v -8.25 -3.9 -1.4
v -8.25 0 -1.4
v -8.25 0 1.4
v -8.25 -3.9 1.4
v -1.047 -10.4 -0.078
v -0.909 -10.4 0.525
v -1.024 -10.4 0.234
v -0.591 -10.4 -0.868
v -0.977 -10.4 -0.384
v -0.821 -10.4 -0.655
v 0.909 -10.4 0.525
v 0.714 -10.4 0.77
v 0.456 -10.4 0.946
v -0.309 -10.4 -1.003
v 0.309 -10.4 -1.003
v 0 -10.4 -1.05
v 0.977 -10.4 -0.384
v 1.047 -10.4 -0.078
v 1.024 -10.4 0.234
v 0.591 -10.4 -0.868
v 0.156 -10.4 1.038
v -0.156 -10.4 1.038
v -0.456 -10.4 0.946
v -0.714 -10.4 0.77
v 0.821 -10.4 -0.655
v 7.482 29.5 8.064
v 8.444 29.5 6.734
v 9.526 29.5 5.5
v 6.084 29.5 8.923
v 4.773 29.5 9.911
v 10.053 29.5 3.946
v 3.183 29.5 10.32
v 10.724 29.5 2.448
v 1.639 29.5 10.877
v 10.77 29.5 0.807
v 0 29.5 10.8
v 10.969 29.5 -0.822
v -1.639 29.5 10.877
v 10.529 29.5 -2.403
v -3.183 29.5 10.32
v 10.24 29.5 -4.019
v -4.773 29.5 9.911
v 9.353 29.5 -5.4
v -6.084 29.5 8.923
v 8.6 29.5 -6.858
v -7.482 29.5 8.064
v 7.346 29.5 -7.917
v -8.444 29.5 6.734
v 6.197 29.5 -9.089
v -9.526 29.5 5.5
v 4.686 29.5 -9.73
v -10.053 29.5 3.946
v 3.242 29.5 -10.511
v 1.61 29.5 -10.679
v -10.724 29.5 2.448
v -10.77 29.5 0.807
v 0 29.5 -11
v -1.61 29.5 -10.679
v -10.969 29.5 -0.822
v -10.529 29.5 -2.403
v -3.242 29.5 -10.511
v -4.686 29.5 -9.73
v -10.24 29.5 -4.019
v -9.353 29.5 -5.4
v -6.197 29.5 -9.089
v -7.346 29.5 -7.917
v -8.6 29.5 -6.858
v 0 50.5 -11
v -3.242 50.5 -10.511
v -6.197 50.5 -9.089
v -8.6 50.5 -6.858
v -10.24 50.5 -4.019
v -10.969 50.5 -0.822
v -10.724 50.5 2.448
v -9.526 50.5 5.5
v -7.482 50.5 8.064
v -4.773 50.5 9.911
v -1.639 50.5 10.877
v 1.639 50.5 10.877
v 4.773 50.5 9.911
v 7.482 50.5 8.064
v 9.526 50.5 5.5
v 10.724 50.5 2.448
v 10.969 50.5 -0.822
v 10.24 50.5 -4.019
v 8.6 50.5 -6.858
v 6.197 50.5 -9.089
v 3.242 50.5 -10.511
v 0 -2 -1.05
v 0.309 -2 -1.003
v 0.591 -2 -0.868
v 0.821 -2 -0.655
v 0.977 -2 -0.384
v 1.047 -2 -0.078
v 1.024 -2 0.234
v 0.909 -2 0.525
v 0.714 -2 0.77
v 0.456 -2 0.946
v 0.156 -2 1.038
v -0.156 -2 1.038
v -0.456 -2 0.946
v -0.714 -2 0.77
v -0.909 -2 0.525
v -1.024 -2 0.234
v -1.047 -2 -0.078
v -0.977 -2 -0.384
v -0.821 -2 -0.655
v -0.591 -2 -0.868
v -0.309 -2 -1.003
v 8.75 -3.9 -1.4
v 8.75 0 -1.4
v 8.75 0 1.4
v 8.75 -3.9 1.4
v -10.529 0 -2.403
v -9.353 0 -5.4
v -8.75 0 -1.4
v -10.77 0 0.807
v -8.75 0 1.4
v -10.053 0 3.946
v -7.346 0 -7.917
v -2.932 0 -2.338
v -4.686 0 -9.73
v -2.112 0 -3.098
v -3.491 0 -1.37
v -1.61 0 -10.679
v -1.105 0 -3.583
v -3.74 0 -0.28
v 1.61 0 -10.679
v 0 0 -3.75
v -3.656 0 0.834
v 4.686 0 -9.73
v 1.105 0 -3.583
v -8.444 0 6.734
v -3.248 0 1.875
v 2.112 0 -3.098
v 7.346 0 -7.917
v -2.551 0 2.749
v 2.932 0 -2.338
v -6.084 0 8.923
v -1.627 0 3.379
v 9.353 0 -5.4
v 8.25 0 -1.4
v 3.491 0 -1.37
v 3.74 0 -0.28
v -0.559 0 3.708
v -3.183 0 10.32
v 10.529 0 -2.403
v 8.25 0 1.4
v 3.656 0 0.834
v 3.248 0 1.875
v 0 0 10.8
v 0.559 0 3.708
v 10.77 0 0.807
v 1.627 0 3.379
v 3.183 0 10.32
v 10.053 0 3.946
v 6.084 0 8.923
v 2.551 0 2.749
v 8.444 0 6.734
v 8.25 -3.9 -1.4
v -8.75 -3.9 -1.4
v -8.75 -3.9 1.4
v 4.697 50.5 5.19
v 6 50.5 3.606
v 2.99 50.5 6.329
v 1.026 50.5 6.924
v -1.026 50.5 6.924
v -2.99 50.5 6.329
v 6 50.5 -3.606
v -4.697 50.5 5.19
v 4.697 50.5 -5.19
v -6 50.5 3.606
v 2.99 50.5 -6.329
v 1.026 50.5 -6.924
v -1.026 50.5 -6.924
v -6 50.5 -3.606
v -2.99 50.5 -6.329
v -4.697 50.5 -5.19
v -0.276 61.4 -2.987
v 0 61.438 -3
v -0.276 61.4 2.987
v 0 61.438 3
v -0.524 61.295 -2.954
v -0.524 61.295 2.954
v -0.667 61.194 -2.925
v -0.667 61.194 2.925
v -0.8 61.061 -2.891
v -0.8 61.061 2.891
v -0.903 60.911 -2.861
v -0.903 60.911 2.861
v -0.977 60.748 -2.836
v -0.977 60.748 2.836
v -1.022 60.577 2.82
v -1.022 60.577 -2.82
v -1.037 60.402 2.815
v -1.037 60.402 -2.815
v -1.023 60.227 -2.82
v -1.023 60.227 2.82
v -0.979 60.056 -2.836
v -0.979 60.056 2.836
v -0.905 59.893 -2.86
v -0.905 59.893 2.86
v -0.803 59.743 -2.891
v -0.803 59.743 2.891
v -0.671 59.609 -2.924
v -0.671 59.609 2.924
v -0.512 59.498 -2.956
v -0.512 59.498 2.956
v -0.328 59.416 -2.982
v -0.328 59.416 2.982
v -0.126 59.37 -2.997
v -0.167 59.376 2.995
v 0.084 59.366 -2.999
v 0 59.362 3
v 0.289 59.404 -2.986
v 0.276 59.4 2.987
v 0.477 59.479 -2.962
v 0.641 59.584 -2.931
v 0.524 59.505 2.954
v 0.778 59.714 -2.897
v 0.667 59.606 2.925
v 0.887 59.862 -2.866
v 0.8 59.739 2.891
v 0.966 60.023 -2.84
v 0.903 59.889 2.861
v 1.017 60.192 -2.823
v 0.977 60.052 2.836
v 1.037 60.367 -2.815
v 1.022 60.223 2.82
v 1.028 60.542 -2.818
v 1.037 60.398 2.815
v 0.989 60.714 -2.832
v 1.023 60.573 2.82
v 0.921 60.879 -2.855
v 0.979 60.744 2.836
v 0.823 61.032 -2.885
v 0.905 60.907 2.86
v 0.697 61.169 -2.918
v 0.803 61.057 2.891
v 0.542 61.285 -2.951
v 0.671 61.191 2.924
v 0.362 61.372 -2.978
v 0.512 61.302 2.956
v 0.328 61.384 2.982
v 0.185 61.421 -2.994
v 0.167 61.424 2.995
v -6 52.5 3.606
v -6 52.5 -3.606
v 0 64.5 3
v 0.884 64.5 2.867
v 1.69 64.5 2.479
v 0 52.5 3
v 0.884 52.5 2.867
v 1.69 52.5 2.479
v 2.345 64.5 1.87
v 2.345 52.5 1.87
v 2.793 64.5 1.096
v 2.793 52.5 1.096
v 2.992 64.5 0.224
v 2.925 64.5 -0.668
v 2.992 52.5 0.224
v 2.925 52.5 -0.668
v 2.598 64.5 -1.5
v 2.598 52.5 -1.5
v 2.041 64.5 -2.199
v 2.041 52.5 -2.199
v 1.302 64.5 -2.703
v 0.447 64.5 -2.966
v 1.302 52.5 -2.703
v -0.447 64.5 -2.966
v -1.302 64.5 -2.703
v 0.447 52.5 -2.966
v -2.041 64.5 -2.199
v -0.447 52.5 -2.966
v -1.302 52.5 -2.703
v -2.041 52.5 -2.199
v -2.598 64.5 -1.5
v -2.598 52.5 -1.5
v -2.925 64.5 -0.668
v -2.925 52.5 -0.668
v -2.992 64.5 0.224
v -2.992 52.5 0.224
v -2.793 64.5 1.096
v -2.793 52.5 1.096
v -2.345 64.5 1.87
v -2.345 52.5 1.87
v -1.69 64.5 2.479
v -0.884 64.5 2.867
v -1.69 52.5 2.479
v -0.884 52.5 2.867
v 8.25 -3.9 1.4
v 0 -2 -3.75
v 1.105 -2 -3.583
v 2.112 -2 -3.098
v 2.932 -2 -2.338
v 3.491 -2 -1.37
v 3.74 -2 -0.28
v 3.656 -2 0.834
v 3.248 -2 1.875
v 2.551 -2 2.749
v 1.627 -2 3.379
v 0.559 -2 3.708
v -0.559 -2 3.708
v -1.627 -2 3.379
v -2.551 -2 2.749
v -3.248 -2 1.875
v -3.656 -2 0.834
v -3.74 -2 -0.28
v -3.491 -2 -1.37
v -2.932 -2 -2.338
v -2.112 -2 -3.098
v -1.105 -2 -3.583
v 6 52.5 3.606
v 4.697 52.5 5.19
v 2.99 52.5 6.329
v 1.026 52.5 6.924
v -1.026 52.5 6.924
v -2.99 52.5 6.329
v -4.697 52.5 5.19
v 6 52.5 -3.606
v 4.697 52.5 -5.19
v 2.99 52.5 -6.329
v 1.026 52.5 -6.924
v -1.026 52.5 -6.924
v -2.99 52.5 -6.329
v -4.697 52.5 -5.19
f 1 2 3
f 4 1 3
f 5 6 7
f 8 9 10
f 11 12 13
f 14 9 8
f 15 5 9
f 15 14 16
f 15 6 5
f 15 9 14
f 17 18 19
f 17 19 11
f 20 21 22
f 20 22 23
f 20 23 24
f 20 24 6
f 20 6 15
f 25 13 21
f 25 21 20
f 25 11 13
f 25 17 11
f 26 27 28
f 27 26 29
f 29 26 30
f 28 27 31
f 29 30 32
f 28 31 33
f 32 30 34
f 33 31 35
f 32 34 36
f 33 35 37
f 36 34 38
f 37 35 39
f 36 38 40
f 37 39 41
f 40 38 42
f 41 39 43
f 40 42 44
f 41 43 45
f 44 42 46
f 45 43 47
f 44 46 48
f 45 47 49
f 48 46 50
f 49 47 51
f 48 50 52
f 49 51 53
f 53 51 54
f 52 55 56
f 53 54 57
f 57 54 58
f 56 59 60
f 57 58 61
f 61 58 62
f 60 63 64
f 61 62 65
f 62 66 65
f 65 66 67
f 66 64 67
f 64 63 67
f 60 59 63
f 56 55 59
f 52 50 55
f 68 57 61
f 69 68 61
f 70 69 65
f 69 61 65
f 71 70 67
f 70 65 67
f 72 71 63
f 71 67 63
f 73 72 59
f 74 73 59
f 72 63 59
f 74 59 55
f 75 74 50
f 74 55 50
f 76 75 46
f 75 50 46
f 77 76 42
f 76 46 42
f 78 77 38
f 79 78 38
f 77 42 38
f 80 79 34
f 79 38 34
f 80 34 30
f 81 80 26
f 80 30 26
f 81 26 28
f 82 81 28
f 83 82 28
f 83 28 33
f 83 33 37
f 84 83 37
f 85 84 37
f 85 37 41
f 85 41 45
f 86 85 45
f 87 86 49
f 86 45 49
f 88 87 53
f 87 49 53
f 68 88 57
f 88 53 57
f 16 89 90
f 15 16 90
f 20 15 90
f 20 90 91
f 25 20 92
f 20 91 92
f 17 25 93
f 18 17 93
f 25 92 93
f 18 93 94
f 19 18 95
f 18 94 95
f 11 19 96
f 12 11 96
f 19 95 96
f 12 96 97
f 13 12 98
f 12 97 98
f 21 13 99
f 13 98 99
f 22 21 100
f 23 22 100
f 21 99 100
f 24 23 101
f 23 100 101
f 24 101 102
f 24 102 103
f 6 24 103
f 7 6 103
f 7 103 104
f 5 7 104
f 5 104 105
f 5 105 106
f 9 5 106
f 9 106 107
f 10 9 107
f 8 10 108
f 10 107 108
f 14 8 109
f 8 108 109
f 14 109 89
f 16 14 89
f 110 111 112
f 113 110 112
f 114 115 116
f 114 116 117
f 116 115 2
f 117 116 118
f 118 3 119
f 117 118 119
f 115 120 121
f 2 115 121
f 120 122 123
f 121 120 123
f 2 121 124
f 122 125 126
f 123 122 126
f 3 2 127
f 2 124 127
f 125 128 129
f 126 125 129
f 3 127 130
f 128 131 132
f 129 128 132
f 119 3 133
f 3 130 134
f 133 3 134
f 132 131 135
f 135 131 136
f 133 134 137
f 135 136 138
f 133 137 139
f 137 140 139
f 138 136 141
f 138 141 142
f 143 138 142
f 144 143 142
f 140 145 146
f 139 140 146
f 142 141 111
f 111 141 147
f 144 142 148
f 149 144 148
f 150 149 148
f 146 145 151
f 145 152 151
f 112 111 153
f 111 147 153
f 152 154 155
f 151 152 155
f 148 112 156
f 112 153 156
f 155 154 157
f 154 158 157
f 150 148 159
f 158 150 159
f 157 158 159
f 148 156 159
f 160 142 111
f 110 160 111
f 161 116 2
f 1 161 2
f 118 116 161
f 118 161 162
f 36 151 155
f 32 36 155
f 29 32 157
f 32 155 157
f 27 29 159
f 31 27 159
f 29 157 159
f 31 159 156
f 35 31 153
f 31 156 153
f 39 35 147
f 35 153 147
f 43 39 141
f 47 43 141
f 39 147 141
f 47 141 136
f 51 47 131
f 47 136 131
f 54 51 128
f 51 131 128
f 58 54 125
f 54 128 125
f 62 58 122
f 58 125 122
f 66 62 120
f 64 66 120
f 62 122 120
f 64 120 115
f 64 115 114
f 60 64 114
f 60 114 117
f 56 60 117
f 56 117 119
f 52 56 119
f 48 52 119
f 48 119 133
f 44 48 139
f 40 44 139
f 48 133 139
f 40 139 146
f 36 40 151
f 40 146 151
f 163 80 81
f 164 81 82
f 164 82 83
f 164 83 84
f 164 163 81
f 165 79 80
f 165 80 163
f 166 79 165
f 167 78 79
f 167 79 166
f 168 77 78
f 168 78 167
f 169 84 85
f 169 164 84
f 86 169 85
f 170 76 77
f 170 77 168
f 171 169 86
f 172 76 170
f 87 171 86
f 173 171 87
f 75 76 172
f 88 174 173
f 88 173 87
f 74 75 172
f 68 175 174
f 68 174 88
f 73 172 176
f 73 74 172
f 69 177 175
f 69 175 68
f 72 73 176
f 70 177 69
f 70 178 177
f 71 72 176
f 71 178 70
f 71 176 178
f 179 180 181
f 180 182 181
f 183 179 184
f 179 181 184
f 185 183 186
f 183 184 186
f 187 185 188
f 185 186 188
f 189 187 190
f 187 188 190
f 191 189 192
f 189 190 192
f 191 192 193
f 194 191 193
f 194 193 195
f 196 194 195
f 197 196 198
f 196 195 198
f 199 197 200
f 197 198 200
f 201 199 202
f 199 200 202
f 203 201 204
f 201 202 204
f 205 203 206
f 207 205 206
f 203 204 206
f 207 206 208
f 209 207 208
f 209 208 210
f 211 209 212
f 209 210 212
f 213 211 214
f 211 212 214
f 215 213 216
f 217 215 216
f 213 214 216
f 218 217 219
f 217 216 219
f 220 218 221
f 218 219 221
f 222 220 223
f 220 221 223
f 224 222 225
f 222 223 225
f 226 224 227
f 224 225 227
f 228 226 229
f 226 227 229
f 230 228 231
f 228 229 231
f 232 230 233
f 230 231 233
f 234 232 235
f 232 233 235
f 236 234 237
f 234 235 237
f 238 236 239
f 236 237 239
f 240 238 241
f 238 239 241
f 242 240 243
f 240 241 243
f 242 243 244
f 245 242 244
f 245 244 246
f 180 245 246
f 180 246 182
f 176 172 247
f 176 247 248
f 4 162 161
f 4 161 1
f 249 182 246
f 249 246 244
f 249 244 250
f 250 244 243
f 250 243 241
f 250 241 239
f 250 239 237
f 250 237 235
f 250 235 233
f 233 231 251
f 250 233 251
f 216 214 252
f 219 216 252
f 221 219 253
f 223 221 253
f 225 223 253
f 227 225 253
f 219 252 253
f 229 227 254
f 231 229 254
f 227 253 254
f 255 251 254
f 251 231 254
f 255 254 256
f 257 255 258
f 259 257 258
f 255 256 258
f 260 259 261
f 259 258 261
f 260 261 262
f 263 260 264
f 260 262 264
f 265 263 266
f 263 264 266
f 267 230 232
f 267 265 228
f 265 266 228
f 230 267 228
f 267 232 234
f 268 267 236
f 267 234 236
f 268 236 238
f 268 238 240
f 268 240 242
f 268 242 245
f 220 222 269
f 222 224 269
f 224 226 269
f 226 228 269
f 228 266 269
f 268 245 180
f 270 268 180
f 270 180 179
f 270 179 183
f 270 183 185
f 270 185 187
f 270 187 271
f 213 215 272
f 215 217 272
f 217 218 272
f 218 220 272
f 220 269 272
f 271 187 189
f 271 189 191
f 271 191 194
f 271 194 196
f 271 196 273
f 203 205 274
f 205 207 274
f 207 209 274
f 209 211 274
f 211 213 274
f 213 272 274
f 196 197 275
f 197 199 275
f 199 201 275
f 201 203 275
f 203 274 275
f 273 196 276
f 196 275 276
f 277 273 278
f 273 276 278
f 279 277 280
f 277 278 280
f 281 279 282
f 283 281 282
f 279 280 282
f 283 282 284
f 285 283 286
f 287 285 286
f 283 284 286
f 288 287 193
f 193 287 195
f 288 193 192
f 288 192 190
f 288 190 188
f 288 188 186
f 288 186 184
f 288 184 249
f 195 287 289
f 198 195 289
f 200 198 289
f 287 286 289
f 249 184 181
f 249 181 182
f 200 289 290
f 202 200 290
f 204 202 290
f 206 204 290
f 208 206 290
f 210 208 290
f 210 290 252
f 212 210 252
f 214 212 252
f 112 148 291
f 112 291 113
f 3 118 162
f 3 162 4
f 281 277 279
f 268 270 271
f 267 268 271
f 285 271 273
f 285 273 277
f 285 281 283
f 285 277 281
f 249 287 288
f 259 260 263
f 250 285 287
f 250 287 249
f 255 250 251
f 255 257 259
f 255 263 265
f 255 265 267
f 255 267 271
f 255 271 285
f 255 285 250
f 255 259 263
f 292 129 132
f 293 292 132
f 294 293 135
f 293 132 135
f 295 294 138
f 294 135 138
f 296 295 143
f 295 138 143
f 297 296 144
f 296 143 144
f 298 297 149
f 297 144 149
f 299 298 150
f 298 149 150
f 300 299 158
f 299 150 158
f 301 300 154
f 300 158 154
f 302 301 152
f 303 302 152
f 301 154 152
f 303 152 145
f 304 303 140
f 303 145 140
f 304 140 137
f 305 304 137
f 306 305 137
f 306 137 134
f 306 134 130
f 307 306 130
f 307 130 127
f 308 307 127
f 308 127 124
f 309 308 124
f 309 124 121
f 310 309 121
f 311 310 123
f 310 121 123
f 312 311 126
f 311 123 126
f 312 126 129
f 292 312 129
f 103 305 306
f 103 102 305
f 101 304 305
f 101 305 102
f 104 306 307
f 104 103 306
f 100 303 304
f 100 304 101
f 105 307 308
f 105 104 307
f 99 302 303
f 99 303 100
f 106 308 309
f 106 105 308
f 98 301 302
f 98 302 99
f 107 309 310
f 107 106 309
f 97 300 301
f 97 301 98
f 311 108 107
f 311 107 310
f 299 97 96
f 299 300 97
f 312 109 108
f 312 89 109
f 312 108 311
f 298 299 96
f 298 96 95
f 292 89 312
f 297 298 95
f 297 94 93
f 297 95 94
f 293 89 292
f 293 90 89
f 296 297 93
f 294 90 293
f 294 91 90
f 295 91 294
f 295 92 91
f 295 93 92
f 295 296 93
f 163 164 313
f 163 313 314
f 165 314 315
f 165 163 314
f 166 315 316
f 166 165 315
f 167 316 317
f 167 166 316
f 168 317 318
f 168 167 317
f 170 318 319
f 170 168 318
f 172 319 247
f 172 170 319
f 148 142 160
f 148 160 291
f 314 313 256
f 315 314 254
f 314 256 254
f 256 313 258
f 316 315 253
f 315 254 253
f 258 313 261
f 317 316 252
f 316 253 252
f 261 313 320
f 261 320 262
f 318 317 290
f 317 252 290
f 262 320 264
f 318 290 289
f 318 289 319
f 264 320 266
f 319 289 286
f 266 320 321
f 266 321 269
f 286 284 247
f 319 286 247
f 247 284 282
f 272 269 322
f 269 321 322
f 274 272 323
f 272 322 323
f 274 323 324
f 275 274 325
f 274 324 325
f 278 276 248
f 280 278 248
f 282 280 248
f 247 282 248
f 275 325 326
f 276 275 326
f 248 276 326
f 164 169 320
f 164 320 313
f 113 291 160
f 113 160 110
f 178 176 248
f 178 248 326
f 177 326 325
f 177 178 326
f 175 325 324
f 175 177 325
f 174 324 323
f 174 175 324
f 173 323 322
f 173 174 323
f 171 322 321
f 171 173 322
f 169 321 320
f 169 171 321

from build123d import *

# Parameters (mm, degrees)
SKETCH2_R           = 10.8
BOSS_EXTRUDE1_DEPTH = 29.5
SKETCH3_R           = 11
BOSS_EXTRUDE2_DEPTH = 21
BOSS_EXTRUDE3_DEPTH = 2
SKETCH5_R           = 3
BOSS_EXTRUDE4_DEPTH = 12
SKETCH6_R           = 3.75
BOSS_EXTRUDE5_DEPTH = 2
SKETCH7_W           = 0.5
SKETCH7_H           = 2.8
BOSS_EXTRUDE6_DEPTH = 3.9
SKETCH8_R           = 1.05
BOSS_EXTRUDE7_DEPTH = 8.4
SKETCH_1_R          = 1.0375
CUT_EXTRUDE_1_DEPTH = 5


with BuildPart() as part:
    # Sketch2 → Boss-Extrude1 (new body)
    with BuildSketch(Plane(origin=(0, 0, 0), x_dir=(1, 0, 0), z_dir=(0, 1, 0))):
        with Locations(Location((0, 0, 0), (0, 0, 270))):
            Circle(SKETCH2_R)
    extrude(amount=BOSS_EXTRUDE1_DEPTH)

    # Sketch3 → Boss-Extrude2 (add)
    with BuildSketch(Plane(origin=(0, 29.5, 0), x_dir=(1, 0, 0), z_dir=(0, 1, 0))):
        with Locations(Location((0, 0, 0), (0, 0, 90))):
            Circle(SKETCH3_R)
    extrude(amount=BOSS_EXTRUDE2_DEPTH)

    # Sketch4 → Boss-Extrude3 (add)
    with BuildSketch(Plane(origin=(0, 50.5, 0), x_dir=(1, 0, 0), z_dir=(0, 1, 0))):
        with BuildLine():
            Line((6, 3.605551275), (6, -3.605551275))
            ThreePointArc((6, -3.605551275), (0, -7), (-6, -3.605551275))
            Line((-6, -3.605551275), (-6, 3.605551275))
            ThreePointArc((-6, 3.605551275), (0, 7), (6, 3.605551275))
        make_face()
    extrude(amount=BOSS_EXTRUDE3_DEPTH)

    # Sketch5 → Boss-Extrude4 (add)
    with BuildSketch(Plane(origin=(0, 52.5, 0), x_dir=(1, 0, 0), z_dir=(0, 1, 0))):
        with Locations(Location((0, 0, 0), (0, 0, 270))):
            Circle(SKETCH5_R)
    extrude(amount=BOSS_EXTRUDE4_DEPTH)

    # Sketch6 → Boss-Extrude5 (add)
    with BuildSketch(Plane.XZ):
        with Locations(Location((0, 0, 0), (0, 0, 270))):
            Circle(SKETCH6_R)
    extrude(amount=BOSS_EXTRUDE5_DEPTH)

    # Sketch7 → Boss-Extrude6 (add)
    with BuildSketch(Plane.XZ):
        with Locations((-8.5, 0)):
            Rectangle(SKETCH7_W, SKETCH7_H)
        with Locations((8.5, 0)):
            Rectangle(SKETCH7_W, SKETCH7_H)
    extrude(amount=BOSS_EXTRUDE6_DEPTH)

    # Sketch8 → Boss-Extrude7 (add)
    with BuildSketch(Plane.XZ.offset(2)):
        with Locations(Location((0, 0, 0), (0, 0, 270))):
            Circle(SKETCH8_R)
    extrude(amount=BOSS_EXTRUDE7_DEPTH)

    # 草图1 → 切除-拉伸1 (cut, symmetric)
    with BuildSketch(Plane.XY):
        with Locations(Location((0, 60.4, 0), (0, 0, 89.999999986))):
            Circle(SKETCH_1_R)
    extrude(amount=CUT_EXTRUDE_1_DEPTH, both=True, mode=Mode.SUBTRACT)


solid = part.part
